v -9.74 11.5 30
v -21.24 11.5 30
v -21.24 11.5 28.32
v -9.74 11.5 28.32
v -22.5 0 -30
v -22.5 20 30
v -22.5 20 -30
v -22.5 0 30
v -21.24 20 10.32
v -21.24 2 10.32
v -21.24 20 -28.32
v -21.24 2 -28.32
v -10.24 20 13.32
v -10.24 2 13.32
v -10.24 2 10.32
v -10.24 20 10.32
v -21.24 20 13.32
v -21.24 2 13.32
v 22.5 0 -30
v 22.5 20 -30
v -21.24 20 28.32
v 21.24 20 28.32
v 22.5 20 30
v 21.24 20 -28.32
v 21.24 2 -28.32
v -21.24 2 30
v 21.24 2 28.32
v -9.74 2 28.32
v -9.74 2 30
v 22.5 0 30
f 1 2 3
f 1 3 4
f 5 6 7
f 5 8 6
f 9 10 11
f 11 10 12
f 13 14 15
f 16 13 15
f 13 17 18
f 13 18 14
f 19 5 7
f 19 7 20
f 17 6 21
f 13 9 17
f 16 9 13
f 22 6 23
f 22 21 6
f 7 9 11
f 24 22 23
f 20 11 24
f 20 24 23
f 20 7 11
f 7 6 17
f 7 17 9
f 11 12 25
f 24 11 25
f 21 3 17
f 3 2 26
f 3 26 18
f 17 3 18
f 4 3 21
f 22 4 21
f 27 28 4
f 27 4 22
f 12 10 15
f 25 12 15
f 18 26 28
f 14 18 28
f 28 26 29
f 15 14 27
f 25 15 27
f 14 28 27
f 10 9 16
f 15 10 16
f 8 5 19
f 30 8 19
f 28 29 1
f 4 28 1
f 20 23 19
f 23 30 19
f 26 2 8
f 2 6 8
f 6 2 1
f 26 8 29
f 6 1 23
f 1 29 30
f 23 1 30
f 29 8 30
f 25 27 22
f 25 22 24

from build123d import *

# Parameters (mm, degrees)
IZIM1_W                     = 45
IZIM1_H                     = 60
Y_KSEKLIK_EKSTR_ZYON1_DEPTH = 2
IZIM2_W                     = 45
IZIM2_H                     = 60
IZIM2_W_2                   = 42.48
IZIM2_H_2                   = 56.64
Y_KSEKLIK_EKSTR_ZYON2_DEPTH = 18
IZIM6_W                     = 11.5
IZIM6_H                     = 9.5
KES_EKSTR_ZYON2_DEPTH       = 18
IZIM7_W                     = 11
IZIM7_H                     = 3
Y_KSEKLIK_EKSTR_ZYON3_DEPTH = 18


with BuildPart() as part:
    # Çizim1 → Yükseklik-Ekstrüzyon1 (new body)
    with BuildSketch(Plane(origin=(0, 0, 0), x_dir=(1, 0, 0), z_dir=(0, 1, 0))):
        Rectangle(IZIM1_W, IZIM1_H)
    extrude(amount=Y_KSEKLIK_EKSTR_ZYON1_DEPTH)

    # Çizim2 → Yükseklik-Ekstrüzyon2 (add)
    with BuildSketch(Plane(origin=(0, 2, 0), x_dir=(1, 0, 0), z_dir=(0, 1, 0))):
        Rectangle(IZIM2_W, IZIM2_H)
        Rectangle(IZIM2_W_2, IZIM2_H_2, mode=Mode.SUBTRACT)
    extrude(amount=Y_KSEKLIK_EKSTR_ZYON2_DEPTH)

    # Çizim6 → Kes-Ekstrüzyon2 (cut)
    with BuildSketch(Plane.XY.offset(30)):
        with Locations((-15.49, 6.75)):
            Rectangle(IZIM6_W, IZIM6_H)
    extrude(amount=-KES_EKSTR_ZYON2_DEPTH, mode=Mode.SUBTRACT)

    # Çizim7 → Yükseklik-Ekstrüzyon3 (add)
    with BuildSketch(Plane(origin=(0, 2, 0), x_dir=(1, 0, 0), z_dir=(0, 1, 0))):
        with Locations((-15.74, -11.82)):
            Rectangle(IZIM7_W, IZIM7_H)
    extrude(amount=Y_KSEKLIK_EKSTR_ZYON3_DEPTH)


solid = part.part
